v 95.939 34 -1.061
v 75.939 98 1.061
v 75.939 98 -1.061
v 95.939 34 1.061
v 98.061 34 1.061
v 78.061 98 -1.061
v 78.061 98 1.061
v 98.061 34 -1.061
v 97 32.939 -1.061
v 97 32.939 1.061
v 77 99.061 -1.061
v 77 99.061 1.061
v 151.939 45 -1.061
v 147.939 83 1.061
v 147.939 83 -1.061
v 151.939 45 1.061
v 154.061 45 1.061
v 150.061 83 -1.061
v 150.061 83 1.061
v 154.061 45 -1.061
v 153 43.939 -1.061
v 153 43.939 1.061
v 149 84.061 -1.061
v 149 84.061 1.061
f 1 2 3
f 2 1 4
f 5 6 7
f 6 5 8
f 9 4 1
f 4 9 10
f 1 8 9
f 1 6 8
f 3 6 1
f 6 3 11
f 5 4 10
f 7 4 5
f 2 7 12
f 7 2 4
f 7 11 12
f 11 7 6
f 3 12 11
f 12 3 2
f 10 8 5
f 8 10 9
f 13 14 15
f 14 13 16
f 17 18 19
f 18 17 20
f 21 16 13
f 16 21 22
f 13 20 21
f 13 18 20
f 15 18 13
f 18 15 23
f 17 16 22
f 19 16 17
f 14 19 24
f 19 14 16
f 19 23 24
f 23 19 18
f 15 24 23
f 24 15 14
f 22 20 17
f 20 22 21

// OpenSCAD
/*
Determine whether two segements intersect.

1.共線段
2.非共線段
*/
function rnd_v(init_value,end_value)=round(rands(init_value,end_value,1)[0]);
init_value=0;
end_value=200;
segement_a=[[rnd_v(init_value,end_value),rnd_v(init_value,end_value)],[rnd_v(init_value,end_value),rnd_v(init_value,end_value)]];
segement_b=[[rnd_v(init_value,end_value),rnd_v(init_value,end_value)],[rnd_v(init_value,end_value),rnd_v(init_value,end_value)]];
thickness=3;


module draw_line(p1,p2,thickness,fn=4){
    $fn=fn;    
    hull(){
        translate(p1)sphere(thickness/2);
        translate(p2)sphere(thickness/2);
        } }

segements=[segement_a,segement_b];


for(i=segements)
    draw_line(i[0],i[1],thickness,4);


function dot(v1,v2)=
    v1.x*v2.x+v1.y*v2.y;
    
function cross_(v1,v2)=
    v1.x*v2.y-v1.y*v2.x;

function seg_inters_compare(line_a,line_b)=
    cross_(line_b[1]-line_b[0],line_a[1]-line_b[0])>=0 &&
    cross_(line_b[1]-line_b[0],line_a[0]-line_b[0])<=0 ||
    cross_(line_b[1]-line_b[0],line_a[1]-line_b[0])<=0 &&
    cross_(line_b[1]-line_b[0],line_a[0]-line_b[0])>=0 ?   
    (cross_(line_a[0]-line_b[1],line_a[1]-line_b[1])>0 &&
    cross_(line_a[0]-line_b[0],line_a[1]-line_b[0])<0) ||
    (cross_(line_a[0]-line_b[1],line_a[1]-line_b[1])<0 &&
    cross_(line_a[0]-line_b[0],line_a[1]-line_b[0])>0)? 
    true:    
    false:false;
    
    
echo(seg_inters_compare(segement_a,segement_b));    
    
